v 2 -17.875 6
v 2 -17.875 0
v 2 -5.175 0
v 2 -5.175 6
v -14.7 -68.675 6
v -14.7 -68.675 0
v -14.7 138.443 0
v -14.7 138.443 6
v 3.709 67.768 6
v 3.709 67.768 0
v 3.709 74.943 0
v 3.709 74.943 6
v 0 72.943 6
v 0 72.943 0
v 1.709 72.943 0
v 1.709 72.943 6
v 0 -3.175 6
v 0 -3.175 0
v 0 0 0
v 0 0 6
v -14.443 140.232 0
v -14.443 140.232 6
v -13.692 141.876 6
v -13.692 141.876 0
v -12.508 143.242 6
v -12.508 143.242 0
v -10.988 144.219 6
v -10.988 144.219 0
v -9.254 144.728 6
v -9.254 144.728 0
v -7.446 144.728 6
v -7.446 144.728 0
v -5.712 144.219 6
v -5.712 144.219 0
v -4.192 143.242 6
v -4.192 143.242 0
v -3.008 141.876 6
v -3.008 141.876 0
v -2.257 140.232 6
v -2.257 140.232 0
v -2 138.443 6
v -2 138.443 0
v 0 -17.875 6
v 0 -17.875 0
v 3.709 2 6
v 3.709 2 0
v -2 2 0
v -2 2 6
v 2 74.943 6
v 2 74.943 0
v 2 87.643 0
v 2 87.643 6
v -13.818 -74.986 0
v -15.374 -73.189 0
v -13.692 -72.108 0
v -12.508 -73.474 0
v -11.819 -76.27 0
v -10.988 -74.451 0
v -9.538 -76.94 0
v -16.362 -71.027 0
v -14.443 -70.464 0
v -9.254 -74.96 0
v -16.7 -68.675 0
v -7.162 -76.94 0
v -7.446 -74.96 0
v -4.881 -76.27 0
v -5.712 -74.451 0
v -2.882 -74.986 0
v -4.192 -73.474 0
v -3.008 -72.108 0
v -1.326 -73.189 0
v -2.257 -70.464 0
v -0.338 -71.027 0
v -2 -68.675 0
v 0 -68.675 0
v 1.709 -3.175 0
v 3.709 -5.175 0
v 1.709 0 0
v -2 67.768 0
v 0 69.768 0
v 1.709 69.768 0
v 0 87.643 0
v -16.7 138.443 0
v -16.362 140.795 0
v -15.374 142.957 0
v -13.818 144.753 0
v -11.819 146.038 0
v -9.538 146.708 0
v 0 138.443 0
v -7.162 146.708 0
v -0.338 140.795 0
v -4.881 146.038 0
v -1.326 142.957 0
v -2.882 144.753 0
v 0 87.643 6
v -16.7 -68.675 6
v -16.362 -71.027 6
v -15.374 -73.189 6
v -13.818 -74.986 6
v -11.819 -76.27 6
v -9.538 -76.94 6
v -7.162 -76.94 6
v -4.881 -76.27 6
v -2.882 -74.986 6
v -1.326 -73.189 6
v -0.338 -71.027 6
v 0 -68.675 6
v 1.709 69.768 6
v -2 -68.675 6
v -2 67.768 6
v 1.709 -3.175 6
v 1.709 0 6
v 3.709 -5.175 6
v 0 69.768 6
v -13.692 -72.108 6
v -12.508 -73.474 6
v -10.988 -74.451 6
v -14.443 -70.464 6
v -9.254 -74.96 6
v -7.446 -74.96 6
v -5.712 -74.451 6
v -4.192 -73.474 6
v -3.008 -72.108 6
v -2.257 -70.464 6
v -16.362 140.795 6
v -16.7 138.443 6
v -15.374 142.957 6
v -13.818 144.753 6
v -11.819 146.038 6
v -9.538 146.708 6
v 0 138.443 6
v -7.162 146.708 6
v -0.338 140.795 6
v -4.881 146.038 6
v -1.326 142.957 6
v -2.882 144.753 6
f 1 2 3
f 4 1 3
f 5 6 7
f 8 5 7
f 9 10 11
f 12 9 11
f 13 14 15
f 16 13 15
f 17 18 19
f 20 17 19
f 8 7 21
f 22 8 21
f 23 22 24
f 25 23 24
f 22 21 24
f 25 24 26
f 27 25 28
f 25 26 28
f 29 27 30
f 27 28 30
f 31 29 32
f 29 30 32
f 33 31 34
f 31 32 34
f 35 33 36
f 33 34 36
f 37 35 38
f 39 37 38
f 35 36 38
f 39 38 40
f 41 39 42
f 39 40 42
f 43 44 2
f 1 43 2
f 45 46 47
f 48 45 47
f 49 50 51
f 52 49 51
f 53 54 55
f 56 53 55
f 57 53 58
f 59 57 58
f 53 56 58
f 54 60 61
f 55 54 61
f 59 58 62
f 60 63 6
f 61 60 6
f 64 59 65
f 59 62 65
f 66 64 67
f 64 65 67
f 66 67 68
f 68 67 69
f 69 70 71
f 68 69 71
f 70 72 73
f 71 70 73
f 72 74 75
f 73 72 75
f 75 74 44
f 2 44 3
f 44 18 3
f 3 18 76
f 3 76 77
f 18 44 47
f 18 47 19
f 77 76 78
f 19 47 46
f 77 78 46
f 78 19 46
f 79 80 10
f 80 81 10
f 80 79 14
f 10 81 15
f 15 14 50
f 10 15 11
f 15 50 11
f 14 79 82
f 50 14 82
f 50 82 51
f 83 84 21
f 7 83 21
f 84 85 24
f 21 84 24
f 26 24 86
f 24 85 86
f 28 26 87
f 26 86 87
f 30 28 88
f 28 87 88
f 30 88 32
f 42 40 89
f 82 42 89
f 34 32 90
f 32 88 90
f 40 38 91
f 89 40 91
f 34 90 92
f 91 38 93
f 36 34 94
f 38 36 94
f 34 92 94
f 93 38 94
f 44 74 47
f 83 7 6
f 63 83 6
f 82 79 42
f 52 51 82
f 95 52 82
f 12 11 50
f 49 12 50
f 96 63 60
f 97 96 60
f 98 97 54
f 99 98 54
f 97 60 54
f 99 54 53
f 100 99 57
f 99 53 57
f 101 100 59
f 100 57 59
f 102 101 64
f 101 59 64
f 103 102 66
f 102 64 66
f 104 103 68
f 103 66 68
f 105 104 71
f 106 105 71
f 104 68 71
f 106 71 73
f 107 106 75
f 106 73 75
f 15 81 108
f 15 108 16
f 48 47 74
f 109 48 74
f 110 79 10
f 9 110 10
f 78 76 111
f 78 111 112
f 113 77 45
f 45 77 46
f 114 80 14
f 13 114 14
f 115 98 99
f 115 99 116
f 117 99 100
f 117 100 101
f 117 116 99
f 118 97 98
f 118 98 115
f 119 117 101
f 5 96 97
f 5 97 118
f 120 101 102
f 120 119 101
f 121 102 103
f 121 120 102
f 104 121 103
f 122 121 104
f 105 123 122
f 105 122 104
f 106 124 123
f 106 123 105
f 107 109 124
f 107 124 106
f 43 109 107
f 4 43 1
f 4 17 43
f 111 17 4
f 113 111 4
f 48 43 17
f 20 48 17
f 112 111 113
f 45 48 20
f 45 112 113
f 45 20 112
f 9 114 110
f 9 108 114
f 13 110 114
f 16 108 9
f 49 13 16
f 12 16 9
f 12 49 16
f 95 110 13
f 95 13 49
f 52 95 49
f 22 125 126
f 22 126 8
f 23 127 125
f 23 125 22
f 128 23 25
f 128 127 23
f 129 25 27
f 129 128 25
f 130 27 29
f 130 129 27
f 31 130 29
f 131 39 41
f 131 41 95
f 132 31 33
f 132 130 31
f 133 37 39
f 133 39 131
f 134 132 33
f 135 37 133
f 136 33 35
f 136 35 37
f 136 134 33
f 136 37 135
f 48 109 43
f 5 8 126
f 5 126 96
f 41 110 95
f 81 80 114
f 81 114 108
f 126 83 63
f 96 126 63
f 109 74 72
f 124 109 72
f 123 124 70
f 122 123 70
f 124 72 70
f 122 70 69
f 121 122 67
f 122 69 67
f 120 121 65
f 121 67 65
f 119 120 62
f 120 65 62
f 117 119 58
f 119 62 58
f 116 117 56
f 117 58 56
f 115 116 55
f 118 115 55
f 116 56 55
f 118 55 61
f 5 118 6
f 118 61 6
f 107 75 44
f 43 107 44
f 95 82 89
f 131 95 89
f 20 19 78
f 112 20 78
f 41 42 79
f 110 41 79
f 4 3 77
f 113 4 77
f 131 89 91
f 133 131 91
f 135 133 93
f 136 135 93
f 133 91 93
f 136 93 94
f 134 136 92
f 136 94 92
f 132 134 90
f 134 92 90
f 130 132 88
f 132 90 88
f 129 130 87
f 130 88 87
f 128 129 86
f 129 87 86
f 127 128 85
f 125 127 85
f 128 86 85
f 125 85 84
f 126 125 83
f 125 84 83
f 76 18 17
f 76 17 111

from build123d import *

# Parameters (mm, degrees)
F0_W     = 1.70942
F0_H     = 3.175
F1_DEPTH = 6


with BuildPart() as f1:
    # F0 (on Top) → F1 (new body)
    with BuildSketch(Plane.XY):
        with BuildLine():
            Line((3.70942, 2), (-2, 2))
            Line((-2, 2), (-2, -68.675))
            ThreePointArc((-2, -68.675), (-8.35, -75.025), (-14.7, -68.675))
            Line((-14.7, -68.675), (-14.7, 138.442501))
            ThreePointArc((-14.7, 138.442501), (-8.35, 144.792501), (-2, 138.442501))
            Line((-2, 138.442501), (-2, 67.767501))
            Line((-2, 67.767501), (3.70942, 67.767501))
            Line((3.70942, 67.767501), (3.70942, 74.942501))
            Line((3.70942, 74.942501), (2, 74.942501))
            Line((2, 74.942501), (2, 87.642501))
            Line((2, 87.642501), (0, 87.642501))
            Line((0, 87.642501), (0, 138.442501))
            ThreePointArc((0, 138.442501), (-8.35, 146.792501), (-16.7, 138.442501))
            Line((-16.7, 138.442501), (-16.7, -68.675))
            ThreePointArc((-16.7, -68.675), (-8.35, -77.025), (0, -68.675))
            Line((0, -68.675), (0, -17.875))
            Line((0, -17.875), (2, -17.875))
            Line((2, -17.875), (2, -5.175))
            Line((2, -5.175), (3.70942, -5.175))
            Line((3.70942, -5.175), (3.70942, 2))
        make_face()
        with Locations((0.85471, -1.5875)):
            Rectangle(F0_W, F0_H, mode=Mode.SUBTRACT)
        with Locations((0.85471, 71.355001)):
            Rectangle(F0_W, F0_H, mode=Mode.SUBTRACT)
    extrude(amount=F1_DEPTH)


solid = f1.part
